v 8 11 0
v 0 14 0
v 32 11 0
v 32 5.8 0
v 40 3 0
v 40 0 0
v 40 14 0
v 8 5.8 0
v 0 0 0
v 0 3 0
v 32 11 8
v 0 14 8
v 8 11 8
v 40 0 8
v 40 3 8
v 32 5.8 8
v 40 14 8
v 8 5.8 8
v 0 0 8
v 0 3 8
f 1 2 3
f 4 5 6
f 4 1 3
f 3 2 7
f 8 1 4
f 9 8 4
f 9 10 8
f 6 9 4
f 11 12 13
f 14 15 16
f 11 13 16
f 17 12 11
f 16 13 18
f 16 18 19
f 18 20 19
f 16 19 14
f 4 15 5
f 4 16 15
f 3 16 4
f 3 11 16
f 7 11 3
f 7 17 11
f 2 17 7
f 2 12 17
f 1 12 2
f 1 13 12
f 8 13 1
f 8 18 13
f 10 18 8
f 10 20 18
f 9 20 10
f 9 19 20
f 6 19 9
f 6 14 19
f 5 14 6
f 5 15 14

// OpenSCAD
$fn = 32;

// ----------------------------------------------------------------------
// Key bar: dovetail key, 8 mm thick
// ----------------------------------------------------------------------

// --- parameters (mm) ---
profile_height = 8;       // extrusion height
profile_points = 10;      // points of the closed outline

profile = [[0, 0], [40, 0], [40, 3], [32, 5.8], [32, 11], [40, 14], [0, 14], [8, 11], [8, 5.8], [0, 3]];  // single closed polygon, 10 points, counter clockwise

// --- the one profile operation ---
linear_extrude(height = profile_height) polygon(points = profile);
